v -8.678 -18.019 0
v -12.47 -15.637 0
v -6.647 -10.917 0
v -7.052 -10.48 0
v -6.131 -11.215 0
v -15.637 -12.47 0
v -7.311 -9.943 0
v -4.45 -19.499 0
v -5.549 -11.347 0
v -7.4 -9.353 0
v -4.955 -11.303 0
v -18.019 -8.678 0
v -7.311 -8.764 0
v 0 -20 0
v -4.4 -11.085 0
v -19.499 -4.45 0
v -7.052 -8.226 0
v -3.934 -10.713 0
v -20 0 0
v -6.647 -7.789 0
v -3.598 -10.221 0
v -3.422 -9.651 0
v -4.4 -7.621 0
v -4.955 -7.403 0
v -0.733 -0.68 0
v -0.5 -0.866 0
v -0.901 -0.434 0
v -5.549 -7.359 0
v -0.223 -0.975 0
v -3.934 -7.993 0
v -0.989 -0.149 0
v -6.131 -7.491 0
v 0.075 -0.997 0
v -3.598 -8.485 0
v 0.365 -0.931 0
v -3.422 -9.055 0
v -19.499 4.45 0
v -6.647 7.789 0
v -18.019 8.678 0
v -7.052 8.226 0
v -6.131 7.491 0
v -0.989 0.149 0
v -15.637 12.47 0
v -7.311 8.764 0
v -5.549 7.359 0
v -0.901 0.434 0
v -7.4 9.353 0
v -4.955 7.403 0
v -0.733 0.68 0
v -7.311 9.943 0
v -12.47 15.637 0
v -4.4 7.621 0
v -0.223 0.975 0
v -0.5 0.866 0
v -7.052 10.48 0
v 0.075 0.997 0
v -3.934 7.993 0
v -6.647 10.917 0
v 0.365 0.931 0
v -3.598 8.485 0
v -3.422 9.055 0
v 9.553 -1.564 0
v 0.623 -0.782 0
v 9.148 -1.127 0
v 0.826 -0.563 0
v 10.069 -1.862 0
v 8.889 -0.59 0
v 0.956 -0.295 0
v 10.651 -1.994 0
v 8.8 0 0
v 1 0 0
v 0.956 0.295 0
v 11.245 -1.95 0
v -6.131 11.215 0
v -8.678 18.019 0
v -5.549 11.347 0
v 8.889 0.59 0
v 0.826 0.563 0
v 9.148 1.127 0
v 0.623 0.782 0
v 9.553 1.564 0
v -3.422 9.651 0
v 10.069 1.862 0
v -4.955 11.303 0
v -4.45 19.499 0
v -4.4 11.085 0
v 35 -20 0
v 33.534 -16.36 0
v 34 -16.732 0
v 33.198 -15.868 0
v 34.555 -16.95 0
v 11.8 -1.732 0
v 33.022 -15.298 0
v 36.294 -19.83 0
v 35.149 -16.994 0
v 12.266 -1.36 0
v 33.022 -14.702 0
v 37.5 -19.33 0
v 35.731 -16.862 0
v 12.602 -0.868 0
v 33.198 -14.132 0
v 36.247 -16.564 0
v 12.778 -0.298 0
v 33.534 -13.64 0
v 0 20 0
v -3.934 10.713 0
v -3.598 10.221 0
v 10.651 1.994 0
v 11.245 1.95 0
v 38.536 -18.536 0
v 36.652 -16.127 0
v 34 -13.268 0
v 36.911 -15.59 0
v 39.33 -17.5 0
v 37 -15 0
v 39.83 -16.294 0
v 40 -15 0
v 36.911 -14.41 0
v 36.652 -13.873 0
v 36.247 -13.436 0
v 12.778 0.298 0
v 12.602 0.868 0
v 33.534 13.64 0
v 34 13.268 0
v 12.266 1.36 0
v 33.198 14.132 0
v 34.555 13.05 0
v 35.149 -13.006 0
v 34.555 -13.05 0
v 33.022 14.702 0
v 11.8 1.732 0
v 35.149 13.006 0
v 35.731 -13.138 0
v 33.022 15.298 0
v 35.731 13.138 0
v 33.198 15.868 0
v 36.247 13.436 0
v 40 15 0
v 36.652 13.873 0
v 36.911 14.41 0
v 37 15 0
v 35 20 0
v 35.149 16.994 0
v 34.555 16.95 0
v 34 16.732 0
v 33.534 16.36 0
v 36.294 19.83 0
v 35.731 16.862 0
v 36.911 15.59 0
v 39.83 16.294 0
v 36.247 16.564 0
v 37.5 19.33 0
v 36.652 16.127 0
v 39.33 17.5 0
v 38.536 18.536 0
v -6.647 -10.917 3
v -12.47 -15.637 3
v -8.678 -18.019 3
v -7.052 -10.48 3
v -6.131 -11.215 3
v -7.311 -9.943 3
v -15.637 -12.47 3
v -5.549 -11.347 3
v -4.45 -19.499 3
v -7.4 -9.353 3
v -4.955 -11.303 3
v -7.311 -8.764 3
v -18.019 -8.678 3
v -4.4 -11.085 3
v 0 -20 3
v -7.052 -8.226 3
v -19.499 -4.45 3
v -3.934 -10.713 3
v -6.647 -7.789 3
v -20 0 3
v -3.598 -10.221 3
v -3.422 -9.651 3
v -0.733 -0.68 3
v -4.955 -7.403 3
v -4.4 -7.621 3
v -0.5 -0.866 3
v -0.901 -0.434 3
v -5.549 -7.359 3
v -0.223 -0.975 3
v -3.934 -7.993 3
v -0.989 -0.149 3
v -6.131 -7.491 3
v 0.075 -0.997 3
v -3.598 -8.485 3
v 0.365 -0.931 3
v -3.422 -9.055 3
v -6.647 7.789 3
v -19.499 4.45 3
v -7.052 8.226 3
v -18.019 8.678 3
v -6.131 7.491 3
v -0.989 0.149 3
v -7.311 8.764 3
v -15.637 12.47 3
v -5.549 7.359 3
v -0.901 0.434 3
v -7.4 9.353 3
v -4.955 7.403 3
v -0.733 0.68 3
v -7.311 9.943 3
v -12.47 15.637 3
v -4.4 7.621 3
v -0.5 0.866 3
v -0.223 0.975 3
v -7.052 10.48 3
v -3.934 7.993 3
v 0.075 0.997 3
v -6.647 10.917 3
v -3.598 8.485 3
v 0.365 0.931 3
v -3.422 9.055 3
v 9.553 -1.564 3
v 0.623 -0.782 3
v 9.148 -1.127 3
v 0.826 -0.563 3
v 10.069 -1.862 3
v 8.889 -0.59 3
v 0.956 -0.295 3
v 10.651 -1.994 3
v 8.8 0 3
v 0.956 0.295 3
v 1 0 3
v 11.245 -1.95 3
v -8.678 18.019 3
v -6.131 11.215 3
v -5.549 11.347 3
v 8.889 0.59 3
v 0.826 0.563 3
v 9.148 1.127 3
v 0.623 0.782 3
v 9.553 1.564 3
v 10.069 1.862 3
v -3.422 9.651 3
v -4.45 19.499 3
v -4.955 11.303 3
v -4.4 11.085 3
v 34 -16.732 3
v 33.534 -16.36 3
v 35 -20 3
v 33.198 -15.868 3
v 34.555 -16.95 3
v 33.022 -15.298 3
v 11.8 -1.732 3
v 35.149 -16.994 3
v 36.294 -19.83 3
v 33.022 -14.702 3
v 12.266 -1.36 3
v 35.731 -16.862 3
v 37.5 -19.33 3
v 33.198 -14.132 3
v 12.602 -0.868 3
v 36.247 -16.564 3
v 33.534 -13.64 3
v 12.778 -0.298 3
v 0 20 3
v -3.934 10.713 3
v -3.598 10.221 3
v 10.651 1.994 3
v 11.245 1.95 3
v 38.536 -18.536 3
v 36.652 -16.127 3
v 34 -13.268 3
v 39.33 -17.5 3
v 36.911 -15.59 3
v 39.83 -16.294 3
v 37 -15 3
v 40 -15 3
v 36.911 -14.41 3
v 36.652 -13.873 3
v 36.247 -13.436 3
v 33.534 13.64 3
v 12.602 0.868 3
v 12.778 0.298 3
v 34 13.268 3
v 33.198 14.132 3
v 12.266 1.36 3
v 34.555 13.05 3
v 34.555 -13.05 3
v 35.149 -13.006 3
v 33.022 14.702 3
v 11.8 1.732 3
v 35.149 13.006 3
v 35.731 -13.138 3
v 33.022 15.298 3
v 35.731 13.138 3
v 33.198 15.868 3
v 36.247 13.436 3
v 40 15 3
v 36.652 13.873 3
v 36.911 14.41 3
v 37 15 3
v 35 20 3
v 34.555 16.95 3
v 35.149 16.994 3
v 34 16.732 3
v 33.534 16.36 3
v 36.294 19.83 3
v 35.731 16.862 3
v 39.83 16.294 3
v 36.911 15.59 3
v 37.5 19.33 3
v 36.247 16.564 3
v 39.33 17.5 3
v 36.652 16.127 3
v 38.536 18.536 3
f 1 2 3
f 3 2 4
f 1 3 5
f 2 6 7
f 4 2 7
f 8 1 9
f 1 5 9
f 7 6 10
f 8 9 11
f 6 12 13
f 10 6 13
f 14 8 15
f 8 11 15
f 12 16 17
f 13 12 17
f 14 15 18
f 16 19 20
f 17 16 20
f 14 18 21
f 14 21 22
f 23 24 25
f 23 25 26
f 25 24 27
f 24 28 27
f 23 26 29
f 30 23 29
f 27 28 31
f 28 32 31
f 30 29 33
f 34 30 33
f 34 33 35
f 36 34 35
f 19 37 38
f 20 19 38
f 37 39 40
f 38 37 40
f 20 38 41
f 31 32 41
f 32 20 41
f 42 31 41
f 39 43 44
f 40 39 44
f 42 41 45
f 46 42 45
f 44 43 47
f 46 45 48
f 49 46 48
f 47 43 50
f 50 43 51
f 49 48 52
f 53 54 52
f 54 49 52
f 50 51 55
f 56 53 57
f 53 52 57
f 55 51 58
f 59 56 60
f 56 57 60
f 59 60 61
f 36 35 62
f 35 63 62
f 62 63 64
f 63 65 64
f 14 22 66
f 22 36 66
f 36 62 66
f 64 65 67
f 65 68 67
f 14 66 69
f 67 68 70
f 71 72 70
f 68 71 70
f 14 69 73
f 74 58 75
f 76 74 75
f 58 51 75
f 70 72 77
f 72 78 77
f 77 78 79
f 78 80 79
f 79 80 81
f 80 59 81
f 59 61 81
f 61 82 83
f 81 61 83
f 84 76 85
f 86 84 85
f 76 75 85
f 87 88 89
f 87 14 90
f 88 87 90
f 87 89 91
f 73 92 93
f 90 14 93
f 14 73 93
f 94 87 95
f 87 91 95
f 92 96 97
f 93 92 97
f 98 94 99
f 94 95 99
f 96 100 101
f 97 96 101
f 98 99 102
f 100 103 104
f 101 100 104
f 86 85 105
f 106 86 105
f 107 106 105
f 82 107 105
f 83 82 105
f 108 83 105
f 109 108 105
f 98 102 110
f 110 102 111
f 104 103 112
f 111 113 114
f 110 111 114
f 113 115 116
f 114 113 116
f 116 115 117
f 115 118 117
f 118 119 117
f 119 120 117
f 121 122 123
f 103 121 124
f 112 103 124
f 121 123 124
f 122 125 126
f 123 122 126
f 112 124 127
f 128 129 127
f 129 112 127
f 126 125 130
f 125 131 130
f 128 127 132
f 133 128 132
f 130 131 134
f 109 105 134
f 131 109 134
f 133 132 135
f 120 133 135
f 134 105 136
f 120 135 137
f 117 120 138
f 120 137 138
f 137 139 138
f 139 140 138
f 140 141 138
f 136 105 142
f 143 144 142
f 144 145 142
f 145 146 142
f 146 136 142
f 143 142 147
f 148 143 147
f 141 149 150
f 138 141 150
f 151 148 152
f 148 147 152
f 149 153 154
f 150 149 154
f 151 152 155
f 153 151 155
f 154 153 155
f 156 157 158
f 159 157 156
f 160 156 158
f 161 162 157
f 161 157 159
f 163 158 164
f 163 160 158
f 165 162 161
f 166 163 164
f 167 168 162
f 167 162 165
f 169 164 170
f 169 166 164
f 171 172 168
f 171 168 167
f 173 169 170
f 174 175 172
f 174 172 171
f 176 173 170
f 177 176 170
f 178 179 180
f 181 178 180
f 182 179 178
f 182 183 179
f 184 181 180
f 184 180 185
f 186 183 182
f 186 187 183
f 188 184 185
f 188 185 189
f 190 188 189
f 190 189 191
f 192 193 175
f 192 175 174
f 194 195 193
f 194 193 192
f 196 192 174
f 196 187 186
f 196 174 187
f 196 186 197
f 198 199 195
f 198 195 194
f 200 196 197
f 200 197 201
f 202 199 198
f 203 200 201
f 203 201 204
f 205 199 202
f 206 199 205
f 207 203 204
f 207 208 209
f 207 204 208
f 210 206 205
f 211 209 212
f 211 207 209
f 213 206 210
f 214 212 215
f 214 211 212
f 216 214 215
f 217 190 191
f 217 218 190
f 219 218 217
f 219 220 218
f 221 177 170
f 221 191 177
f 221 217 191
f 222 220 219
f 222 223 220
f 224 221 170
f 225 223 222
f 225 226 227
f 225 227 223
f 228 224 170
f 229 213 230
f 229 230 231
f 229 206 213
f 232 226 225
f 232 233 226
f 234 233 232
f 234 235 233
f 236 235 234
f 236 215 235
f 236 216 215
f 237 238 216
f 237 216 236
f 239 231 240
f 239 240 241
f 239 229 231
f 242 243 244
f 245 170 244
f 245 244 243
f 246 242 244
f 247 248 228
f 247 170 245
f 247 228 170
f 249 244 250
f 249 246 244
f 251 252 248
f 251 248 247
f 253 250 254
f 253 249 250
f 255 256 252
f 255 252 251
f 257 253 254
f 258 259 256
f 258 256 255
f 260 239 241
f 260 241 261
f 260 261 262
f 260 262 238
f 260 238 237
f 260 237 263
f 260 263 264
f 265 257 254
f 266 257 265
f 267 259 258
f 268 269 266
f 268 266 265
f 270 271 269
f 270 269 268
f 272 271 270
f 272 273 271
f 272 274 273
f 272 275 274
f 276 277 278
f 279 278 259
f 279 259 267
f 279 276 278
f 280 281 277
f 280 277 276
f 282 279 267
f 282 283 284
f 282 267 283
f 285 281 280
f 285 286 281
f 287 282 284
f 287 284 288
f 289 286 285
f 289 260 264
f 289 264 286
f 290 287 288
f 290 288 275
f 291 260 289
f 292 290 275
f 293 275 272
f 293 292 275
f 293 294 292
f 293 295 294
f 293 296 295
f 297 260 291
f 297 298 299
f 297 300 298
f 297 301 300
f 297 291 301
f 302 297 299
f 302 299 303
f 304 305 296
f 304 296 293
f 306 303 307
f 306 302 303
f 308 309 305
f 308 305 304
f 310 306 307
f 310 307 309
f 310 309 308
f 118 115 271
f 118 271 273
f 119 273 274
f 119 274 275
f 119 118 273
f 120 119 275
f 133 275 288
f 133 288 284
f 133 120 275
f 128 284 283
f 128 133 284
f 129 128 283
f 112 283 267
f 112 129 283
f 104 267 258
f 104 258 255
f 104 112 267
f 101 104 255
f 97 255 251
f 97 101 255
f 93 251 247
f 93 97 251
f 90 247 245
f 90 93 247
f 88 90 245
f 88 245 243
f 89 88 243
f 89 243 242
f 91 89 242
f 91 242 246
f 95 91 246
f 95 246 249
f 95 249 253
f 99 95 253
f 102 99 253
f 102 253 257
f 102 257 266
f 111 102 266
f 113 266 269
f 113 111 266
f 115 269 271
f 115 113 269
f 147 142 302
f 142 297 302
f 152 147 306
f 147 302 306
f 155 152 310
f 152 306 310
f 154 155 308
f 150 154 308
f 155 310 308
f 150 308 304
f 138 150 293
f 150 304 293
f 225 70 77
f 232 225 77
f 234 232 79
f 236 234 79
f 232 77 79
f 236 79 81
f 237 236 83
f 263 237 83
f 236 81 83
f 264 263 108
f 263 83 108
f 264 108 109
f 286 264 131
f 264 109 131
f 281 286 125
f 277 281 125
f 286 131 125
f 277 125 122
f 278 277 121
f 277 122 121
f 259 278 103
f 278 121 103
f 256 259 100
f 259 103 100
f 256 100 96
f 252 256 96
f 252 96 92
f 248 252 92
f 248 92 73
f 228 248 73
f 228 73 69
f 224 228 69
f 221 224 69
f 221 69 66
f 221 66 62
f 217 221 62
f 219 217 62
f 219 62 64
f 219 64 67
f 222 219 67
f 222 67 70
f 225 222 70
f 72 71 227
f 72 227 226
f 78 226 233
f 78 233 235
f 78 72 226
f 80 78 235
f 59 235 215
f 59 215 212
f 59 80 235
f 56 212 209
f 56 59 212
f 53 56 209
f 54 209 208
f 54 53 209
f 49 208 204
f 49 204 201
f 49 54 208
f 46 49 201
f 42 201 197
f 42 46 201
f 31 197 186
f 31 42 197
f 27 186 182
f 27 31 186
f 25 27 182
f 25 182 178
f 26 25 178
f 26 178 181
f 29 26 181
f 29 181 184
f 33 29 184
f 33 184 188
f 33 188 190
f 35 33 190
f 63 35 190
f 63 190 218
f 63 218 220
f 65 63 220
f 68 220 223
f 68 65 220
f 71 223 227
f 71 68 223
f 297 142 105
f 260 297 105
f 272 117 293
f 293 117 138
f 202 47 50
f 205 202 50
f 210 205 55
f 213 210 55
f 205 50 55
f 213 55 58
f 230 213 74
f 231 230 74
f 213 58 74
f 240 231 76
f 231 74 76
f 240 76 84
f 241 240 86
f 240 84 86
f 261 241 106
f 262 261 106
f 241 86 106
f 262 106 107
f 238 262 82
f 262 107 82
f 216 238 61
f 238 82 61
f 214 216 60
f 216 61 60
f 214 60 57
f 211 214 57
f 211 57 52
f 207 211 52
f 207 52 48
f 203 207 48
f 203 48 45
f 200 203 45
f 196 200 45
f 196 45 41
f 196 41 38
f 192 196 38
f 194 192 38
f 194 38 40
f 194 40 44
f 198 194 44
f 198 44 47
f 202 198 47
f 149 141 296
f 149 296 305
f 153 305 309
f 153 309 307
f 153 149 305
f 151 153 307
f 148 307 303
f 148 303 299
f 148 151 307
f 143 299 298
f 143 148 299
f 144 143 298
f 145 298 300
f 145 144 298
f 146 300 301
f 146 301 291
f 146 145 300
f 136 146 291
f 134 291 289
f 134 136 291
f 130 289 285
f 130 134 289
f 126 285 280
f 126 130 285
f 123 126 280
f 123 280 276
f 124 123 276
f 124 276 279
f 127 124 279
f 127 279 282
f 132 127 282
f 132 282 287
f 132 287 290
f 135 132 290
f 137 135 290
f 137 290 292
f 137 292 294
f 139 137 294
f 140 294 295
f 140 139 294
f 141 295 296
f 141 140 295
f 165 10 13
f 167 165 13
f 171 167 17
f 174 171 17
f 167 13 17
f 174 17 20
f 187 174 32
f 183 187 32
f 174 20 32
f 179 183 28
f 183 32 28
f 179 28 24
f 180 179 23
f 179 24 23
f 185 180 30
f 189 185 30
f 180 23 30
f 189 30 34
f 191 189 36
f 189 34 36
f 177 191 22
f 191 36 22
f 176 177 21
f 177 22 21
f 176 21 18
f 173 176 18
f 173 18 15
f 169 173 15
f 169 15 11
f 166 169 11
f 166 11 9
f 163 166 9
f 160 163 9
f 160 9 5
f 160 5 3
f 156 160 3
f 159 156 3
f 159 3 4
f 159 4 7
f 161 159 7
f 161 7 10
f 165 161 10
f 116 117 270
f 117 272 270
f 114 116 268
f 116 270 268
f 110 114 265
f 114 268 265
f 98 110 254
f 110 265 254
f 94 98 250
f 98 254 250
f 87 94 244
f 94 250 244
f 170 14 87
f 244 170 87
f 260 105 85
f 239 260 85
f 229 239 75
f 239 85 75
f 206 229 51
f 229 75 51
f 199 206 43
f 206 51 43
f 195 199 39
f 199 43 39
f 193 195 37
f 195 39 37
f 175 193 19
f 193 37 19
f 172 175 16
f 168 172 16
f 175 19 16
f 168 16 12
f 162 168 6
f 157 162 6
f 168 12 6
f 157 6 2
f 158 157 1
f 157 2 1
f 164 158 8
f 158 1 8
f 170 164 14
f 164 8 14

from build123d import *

# Parameters (mm, degrees)
SKIZZE1_R                       = 1
SKIZZE1_R_2                     = 2
AUFSATZ_LINEAR_AUSTRAGEN1_DEPTH = 3
SKIZZE2_R                       = 2
SCHNITT_LINEAR_AUSTRAGEN1_DEPTH = 45.821869662
VERRUNDUNG1_R                   = 5


with BuildPart() as part:
    # Skizze1 → Aufsatz-Linear austragen1 (new body)
    with BuildSketch(Plane.XY):
        with BuildLine():
            Line((40, 20), (0, 20))
            ThreePointArc((0, 20), (-20, 0), (0, -20))
            Line((0, -20), (40, -20))
            Line((40, -20), (40, 20))
        make_face()
        Circle(SKIZZE1_R, mode=Mode.SUBTRACT)
        with Locations((35, 15)):
            Circle(SKIZZE1_R_2, mode=Mode.SUBTRACT)
        with Locations((35, -15)):
            Circle(SKIZZE1_R_2, mode=Mode.SUBTRACT)
    extrude(amount=AUFSATZ_LINEAR_AUSTRAGEN1_DEPTH)

    # Skizze2 → Schnitt-Linear austragen1 (cut, through all)
    with BuildSketch(Plane(origin=(0, 0, 0), x_dir=(-1, 0, 0), z_dir=(0, 0, -1))):
        with Locations((-10.8, 0)):
            Circle(SKIZZE2_R)
        with Locations((5.4, 9.353074361)):
            Circle(SKIZZE2_R)
        with Locations((5.4, -9.353074361)):
            Circle(SKIZZE2_R)
    extrude(amount=-SCHNITT_LINEAR_AUSTRAGEN1_DEPTH, mode=Mode.SUBTRACT)

    # Verrundung1
    verrundung1_edges = [part.edges().sort_by_distance(p)[0] for p in [
        (40, 20, 1.5),
        (40, -20, 1.5),
    ]]
    fillet(verrundung1_edges, radius=VERRUNDUNG1_R)


solid = part.part
